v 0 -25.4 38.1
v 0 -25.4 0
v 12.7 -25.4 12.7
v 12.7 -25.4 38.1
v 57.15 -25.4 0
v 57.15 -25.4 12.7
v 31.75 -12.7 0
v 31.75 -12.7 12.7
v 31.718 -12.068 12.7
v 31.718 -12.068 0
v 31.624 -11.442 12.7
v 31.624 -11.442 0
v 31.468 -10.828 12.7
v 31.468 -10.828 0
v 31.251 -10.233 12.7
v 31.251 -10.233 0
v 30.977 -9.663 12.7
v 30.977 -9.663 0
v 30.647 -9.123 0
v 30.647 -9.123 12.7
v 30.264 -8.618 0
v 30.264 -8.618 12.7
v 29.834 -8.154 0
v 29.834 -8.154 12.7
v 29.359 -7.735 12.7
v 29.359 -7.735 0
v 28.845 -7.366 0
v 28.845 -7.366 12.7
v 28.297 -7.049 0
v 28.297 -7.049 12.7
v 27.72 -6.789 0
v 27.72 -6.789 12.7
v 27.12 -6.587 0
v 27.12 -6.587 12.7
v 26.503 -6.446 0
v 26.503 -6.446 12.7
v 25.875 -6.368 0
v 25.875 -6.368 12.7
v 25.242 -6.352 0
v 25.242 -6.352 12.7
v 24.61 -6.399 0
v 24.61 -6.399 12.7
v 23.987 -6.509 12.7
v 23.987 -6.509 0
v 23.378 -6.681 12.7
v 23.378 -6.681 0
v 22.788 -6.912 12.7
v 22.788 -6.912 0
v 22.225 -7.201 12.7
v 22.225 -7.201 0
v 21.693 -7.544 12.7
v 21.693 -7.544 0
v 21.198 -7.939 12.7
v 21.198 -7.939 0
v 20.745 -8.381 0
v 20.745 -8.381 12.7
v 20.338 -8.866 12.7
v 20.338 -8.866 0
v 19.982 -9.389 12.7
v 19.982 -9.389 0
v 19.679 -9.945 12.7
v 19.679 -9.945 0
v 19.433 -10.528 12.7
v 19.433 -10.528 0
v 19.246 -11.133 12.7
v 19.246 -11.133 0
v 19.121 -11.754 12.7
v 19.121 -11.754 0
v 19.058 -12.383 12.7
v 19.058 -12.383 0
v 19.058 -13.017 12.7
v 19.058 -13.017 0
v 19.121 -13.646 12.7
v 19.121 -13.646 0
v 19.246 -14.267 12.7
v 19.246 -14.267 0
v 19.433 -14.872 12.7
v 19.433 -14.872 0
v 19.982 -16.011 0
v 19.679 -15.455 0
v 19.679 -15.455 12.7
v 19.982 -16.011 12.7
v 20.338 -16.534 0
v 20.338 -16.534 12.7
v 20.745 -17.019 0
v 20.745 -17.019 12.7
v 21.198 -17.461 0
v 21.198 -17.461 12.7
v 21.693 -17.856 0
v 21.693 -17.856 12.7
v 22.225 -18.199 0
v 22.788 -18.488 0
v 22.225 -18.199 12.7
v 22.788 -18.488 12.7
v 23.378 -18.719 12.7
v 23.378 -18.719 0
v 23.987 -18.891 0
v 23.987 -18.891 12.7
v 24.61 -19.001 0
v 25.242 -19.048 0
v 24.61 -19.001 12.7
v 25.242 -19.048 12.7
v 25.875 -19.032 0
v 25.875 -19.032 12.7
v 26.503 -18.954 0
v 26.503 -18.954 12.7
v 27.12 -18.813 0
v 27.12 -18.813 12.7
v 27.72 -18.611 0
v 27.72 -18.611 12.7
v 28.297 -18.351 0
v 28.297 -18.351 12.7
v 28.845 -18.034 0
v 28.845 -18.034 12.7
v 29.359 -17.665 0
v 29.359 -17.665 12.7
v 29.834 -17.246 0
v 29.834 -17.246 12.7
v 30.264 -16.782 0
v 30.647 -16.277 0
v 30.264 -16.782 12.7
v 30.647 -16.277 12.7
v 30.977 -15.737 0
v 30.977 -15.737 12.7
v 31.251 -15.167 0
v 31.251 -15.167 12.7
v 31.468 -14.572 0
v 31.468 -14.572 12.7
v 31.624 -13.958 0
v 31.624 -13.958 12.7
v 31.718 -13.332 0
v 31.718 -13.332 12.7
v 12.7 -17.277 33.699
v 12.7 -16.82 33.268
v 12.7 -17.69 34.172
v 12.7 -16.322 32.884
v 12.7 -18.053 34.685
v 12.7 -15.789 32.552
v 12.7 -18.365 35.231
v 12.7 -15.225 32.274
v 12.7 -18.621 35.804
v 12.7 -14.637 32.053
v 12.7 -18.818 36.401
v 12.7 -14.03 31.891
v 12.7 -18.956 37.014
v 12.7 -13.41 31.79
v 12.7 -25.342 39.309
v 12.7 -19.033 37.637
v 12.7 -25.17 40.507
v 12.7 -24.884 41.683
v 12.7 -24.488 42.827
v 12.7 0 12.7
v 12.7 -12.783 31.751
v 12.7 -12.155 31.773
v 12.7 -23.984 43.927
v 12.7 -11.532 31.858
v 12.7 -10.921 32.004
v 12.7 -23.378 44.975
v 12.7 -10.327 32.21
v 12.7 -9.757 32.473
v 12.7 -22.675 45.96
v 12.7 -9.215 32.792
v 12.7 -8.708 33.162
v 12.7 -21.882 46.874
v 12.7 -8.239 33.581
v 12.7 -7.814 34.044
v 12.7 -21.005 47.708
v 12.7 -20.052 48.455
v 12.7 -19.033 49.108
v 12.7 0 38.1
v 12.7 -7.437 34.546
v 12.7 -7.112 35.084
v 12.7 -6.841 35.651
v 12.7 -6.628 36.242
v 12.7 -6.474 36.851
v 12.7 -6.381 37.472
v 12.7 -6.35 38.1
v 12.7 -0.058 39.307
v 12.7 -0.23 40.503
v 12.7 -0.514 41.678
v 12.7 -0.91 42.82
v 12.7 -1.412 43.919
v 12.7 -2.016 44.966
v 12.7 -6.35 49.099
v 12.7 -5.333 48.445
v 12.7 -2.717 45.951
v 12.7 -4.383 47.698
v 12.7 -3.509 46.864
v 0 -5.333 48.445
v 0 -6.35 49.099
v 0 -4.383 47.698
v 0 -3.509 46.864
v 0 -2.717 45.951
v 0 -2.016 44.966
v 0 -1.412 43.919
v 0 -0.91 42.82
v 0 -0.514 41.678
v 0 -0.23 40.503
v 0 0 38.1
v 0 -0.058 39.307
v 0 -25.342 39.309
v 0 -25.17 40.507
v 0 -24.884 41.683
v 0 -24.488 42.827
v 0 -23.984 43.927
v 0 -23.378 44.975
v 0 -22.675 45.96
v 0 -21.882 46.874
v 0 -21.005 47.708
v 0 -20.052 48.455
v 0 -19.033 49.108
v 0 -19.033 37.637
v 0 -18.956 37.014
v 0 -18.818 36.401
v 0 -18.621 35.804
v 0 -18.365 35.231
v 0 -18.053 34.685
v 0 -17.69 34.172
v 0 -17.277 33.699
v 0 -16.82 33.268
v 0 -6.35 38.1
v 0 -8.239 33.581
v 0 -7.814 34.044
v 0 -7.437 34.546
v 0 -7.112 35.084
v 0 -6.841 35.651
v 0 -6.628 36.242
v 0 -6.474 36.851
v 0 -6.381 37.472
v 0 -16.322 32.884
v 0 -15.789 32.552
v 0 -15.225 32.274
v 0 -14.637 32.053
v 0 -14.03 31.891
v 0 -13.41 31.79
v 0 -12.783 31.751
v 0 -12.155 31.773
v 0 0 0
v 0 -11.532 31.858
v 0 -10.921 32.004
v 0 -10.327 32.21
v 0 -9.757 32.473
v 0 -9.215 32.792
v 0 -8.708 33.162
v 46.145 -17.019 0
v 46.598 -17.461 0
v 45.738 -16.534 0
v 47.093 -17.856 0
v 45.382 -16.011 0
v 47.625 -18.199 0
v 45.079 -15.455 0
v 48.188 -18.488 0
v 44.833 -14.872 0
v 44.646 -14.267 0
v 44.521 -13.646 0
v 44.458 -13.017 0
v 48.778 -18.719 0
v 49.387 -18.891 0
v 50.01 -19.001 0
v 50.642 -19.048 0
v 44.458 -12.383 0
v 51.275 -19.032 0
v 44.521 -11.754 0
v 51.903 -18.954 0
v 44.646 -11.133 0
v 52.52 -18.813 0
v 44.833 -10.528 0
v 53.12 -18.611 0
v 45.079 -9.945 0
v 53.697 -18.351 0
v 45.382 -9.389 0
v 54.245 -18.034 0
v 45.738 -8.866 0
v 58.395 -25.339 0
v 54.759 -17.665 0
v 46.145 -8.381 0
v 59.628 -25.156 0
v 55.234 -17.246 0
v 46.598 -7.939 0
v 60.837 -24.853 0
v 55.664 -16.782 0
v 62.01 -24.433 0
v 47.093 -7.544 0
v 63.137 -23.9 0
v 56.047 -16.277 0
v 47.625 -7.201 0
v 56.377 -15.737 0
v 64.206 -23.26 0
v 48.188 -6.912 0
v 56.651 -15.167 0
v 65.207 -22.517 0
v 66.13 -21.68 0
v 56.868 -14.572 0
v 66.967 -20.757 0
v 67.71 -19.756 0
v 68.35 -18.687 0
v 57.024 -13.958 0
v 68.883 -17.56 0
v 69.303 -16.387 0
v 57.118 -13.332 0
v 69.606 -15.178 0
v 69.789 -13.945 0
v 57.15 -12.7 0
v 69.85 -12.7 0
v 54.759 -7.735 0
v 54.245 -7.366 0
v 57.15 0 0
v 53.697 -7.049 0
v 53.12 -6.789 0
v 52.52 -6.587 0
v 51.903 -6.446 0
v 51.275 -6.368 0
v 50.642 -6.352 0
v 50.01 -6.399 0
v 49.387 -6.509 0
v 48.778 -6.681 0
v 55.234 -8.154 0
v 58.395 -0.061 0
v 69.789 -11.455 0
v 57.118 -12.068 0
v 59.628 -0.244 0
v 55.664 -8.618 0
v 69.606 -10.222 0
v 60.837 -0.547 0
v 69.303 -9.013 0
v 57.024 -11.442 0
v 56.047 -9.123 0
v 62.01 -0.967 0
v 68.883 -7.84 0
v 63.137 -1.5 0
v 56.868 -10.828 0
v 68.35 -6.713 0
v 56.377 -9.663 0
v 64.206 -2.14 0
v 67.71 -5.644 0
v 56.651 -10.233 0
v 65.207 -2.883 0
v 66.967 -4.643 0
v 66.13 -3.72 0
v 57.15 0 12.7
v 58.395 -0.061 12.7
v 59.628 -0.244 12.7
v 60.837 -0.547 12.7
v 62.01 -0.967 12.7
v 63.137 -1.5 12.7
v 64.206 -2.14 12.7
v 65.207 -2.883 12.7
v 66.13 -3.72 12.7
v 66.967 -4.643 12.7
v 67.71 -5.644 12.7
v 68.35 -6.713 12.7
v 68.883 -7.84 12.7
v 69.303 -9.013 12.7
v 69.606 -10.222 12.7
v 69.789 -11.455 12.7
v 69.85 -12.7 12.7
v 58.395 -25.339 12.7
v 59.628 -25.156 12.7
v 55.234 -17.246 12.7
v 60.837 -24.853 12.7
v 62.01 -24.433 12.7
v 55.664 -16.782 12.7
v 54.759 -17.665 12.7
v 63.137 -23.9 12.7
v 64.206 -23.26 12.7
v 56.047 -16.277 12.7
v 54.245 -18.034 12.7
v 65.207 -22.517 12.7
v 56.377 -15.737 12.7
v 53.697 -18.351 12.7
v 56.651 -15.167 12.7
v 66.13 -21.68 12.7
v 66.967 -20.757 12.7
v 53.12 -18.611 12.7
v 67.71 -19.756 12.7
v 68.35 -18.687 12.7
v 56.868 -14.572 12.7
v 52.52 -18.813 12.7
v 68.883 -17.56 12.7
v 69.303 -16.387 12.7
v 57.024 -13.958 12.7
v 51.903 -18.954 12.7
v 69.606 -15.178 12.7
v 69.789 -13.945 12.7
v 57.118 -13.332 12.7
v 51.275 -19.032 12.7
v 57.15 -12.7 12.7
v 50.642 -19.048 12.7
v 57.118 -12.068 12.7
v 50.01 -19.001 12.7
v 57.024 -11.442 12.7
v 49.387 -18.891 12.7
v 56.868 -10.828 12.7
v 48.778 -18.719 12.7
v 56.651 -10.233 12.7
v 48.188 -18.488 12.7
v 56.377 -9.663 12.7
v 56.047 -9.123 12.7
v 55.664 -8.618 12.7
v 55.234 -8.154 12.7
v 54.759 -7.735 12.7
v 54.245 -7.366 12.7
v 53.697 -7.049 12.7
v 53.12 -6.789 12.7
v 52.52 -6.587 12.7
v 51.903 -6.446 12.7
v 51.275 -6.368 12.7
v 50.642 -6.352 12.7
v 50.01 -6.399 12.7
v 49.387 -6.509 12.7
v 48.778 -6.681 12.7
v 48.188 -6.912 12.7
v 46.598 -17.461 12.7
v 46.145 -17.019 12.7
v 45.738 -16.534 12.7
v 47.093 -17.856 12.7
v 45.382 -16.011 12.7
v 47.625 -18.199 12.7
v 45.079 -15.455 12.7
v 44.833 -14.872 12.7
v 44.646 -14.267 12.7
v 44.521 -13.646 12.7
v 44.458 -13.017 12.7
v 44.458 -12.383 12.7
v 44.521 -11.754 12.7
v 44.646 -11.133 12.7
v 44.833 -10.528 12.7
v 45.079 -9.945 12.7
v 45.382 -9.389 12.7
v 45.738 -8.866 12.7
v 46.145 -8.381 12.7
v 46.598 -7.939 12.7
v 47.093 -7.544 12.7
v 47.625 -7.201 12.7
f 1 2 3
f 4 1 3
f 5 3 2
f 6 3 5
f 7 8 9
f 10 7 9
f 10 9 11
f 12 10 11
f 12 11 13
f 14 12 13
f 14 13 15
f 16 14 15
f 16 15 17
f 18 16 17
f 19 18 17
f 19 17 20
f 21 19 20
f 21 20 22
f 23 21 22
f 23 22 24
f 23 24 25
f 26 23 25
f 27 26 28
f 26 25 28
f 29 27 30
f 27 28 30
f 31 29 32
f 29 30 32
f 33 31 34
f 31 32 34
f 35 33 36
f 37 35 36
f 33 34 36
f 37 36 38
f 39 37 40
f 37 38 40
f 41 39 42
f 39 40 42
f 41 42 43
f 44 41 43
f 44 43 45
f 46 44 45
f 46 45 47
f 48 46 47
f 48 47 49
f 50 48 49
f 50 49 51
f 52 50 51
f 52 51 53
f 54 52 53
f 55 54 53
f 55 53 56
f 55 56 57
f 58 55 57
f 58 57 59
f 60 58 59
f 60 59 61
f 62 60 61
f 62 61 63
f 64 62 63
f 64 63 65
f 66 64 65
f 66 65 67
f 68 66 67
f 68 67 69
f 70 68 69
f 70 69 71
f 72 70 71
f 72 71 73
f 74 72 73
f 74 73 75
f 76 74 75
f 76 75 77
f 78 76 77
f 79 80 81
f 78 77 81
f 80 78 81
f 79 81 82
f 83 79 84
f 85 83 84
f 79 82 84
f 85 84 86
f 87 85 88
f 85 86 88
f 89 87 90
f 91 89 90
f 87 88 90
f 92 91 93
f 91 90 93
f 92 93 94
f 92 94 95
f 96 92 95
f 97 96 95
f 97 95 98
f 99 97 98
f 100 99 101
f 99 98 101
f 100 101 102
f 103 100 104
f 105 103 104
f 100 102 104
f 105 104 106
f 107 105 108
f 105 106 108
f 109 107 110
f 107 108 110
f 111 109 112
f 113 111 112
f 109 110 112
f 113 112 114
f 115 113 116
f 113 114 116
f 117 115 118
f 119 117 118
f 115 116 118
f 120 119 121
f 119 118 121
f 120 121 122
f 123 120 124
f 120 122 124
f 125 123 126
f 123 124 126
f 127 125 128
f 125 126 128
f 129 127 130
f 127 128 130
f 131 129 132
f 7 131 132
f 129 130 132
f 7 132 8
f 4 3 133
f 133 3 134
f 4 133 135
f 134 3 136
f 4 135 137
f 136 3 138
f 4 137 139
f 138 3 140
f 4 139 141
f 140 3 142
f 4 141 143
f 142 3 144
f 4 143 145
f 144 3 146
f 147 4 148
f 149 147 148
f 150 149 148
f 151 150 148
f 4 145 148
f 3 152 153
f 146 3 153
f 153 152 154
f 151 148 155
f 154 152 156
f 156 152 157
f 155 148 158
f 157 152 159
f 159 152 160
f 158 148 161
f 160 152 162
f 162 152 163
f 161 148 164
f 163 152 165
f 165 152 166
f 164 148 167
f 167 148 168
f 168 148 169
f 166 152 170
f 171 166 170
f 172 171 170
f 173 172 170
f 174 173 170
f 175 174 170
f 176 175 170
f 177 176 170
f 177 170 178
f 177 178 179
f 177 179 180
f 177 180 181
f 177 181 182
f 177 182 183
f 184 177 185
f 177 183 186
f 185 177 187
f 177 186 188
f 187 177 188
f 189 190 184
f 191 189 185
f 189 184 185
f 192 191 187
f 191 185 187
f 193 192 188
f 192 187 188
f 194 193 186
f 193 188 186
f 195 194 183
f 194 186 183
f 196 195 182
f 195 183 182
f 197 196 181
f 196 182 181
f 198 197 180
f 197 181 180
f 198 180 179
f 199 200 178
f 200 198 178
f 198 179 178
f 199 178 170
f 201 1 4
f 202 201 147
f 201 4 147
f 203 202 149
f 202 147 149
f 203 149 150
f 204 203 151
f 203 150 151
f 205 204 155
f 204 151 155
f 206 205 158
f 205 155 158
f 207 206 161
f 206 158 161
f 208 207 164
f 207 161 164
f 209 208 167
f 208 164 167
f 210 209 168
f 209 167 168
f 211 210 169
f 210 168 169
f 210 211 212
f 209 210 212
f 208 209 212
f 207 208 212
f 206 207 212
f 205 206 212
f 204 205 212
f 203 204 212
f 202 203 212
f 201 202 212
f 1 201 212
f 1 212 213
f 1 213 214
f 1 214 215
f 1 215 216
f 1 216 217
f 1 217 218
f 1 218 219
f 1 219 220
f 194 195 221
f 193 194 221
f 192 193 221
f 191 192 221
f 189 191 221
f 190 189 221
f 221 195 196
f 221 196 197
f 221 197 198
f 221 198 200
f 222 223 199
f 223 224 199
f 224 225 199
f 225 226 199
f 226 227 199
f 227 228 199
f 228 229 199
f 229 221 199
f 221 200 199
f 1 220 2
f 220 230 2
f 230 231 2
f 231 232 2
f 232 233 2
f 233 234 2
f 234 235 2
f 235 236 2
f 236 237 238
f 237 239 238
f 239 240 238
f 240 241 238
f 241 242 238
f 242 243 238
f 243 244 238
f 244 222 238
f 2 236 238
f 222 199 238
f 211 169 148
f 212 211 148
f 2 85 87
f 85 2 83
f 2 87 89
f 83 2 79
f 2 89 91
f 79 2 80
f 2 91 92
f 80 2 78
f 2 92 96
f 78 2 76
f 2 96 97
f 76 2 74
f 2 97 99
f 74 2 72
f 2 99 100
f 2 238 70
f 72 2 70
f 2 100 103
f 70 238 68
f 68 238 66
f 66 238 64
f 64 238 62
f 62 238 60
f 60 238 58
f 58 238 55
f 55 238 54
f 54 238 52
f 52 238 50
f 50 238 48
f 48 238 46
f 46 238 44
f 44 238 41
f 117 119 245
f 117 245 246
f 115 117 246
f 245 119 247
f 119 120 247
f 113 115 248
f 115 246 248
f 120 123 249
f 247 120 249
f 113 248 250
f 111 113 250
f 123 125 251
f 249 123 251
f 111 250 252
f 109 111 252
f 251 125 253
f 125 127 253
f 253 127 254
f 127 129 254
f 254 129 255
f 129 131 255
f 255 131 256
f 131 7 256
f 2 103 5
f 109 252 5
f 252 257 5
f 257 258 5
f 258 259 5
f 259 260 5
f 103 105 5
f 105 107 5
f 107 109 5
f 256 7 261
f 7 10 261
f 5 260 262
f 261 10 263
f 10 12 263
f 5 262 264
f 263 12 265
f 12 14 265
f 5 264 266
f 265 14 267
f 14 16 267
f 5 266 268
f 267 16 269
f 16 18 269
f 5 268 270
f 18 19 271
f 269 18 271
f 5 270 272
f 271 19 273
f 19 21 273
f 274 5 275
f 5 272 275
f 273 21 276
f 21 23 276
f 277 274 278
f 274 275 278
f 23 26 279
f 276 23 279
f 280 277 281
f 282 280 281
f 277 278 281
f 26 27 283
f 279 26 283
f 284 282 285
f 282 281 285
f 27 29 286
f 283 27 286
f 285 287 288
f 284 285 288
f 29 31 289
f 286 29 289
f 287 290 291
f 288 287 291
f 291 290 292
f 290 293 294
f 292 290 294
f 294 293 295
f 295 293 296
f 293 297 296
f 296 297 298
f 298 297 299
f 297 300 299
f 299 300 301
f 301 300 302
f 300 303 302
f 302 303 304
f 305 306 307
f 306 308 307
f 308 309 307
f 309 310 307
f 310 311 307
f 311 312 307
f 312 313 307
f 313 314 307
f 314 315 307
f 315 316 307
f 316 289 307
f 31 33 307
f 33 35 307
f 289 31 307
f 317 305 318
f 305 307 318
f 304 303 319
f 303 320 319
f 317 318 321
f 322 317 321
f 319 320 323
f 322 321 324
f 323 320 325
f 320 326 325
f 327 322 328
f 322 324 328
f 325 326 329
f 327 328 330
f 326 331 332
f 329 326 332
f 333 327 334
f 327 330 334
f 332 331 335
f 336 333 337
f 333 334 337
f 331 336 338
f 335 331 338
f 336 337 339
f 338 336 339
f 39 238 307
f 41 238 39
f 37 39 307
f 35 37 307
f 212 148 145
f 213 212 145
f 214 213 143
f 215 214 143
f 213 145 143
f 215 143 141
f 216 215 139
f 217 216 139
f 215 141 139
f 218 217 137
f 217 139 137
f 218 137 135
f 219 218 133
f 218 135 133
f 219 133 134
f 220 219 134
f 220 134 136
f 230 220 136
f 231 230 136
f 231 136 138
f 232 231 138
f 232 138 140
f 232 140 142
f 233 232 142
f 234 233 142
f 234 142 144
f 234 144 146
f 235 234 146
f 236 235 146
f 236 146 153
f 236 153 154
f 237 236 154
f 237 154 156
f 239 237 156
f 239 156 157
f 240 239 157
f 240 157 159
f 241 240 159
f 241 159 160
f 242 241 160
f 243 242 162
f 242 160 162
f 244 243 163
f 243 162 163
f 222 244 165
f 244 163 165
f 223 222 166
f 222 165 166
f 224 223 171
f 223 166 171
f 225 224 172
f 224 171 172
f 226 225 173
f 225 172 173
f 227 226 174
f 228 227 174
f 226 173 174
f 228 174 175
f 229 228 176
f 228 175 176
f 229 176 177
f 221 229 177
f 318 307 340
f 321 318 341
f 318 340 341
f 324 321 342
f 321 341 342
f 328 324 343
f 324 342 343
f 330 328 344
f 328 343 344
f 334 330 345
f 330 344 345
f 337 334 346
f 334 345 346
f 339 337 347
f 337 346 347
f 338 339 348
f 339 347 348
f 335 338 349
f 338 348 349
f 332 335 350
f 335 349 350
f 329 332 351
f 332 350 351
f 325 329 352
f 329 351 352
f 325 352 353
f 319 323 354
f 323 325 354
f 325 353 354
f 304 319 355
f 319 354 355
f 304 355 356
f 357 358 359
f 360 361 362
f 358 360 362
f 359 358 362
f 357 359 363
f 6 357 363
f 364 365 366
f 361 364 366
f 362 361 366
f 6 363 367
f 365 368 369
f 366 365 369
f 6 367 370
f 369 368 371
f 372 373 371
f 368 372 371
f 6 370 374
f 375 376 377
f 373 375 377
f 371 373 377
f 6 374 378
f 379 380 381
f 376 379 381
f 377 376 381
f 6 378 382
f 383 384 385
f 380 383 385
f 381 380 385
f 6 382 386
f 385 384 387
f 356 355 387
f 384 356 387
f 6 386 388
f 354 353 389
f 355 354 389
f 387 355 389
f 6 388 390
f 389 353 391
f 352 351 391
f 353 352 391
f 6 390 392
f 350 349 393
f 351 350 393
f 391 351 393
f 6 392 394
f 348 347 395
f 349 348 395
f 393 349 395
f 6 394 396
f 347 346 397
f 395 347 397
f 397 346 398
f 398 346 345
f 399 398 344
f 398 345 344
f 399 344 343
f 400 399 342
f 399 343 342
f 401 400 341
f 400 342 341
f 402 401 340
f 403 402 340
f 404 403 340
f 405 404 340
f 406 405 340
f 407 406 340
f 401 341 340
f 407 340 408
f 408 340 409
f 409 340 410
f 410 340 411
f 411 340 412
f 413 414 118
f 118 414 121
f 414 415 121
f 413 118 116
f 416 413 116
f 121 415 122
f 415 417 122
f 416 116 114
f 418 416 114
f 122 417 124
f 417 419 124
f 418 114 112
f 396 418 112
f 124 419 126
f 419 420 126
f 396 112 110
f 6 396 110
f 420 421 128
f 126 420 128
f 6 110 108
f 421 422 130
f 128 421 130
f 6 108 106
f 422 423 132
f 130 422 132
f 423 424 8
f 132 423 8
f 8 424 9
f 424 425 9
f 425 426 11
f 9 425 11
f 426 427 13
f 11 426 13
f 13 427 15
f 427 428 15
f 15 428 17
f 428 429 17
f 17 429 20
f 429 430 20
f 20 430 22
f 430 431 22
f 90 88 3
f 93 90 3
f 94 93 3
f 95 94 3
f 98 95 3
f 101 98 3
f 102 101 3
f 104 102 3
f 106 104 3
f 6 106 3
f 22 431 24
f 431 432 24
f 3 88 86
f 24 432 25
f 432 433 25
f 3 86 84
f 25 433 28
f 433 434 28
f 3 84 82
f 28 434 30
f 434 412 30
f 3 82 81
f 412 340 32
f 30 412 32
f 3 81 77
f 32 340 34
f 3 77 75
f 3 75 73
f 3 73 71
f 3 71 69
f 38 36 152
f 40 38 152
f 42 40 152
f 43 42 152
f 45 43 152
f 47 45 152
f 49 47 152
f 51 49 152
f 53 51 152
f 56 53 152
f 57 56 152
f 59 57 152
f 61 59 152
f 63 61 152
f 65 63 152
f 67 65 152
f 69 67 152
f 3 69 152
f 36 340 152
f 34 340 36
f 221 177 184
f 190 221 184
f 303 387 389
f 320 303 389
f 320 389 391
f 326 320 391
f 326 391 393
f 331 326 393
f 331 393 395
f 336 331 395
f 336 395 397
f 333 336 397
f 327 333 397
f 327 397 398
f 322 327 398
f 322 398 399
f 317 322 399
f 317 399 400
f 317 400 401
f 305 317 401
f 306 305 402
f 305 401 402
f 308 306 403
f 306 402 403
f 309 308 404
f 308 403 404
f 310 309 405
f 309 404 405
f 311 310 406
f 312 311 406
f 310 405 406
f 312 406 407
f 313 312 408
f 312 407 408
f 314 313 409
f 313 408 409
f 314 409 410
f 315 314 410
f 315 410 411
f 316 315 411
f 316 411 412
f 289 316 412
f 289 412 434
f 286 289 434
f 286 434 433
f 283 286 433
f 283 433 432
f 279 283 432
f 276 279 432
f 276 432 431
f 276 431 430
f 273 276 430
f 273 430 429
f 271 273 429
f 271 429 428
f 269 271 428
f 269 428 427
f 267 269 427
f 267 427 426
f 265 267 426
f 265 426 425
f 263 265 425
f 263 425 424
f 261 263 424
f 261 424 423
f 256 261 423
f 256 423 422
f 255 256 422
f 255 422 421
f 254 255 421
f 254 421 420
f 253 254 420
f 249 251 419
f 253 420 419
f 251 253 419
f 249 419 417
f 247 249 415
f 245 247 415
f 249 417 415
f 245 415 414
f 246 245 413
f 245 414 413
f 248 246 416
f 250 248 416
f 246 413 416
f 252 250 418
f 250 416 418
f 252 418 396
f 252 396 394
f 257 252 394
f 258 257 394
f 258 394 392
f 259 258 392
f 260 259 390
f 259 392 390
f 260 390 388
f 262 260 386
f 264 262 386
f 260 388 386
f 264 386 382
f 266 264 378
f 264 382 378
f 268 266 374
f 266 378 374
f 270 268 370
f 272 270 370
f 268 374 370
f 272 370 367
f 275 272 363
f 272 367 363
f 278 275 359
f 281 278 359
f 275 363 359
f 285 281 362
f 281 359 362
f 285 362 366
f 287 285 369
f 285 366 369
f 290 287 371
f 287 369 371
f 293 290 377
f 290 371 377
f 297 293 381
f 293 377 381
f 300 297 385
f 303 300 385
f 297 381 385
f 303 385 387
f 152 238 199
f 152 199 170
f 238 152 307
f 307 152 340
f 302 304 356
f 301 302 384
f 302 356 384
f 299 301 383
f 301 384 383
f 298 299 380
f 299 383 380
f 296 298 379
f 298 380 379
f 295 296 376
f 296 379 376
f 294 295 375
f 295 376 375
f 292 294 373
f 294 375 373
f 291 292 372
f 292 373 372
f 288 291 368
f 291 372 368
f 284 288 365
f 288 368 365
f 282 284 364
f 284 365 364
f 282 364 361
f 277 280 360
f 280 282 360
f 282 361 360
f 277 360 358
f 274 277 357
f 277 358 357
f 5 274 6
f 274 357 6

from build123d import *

# Parameters (mm, degrees)
F1_DEPTH = 25.4
F2_R     = 6.35
F3_DEPTH = 25.4
F5_DEPTH = 25.4
F7_DEPTH = 25.4


with BuildPart() as f1:
    # F0 (on Front) → F1 (new body)
    with BuildSketch(Plane.XZ):
        Polygon((12.7, 50.8), (0, 50.8), (0, 0), (69.85, 0), (69.85, 12.7), (12.7, 12.7), align=None)
    extrude(amount=F1_DEPTH)

    # F2 (on face) → F3 (cut)
    with BuildSketch(Plane.XY.offset(12.7)):
        with Locations((25.4, -12.7)):
            Circle(F2_R)
        with BuildLine():
            Line((69.85, -25.4), (69.85, -12.7))
            ThreePointArc((69.85, -12.7), (66.1302561211, -21.6802561211), (57.15, -25.4))
            Line((57.15, -25.4), (69.85, -25.4))
        make_face()
        with Locations((50.8, -12.7)):
            Circle(F2_R)
        with BuildLine():
            Line((69.85, 0), (57.15, 0))
            ThreePointArc((57.15, 0), (66.1302561211, -3.7197438789), (69.85, -12.7))
            Line((69.85, -12.7), (69.85, 0))
        make_face()
    extrude(amount=-F3_DEPTH, mode=Mode.SUBTRACT)

    # F4 (on face) → F5 (cut)
    with BuildSketch(Plane.YZ.offset(12.7)):
        with BuildLine():
            Line((0, 38.1), (0, 39.259262383))
            Line((0, 39.259262383), (0, 50.8))
            Line((0, 50.8), (-12.7, 50.8))
            ThreePointArc((-12.7, 50.8), (-3.7197438789, 47.0802561211), (0, 38.1))
        make_face()
        with BuildLine():
            ThreePointArc((-25.4, 38.1), (-21.6802561211, 47.0802561211), (-12.7, 50.8))
            Line((-12.7, 50.8), (-25.4, 50.8))
            Line((-25.4, 50.8), (-25.4, 39.259262383))
            Line((-25.4, 39.259262383), (-25.4, 38.1))
        make_face()
    extrude(amount=-F5_DEPTH, mode=Mode.SUBTRACT)

    # F6 (on face) → F7 (cut)
    with BuildSketch(Plane.YZ.offset(12.7)):
        with BuildLine():
            Line((-19.0331310429, 38.5625485848), (-19.0331310429, 37.6374514152))
            ThreePointArc((-19.0331310429, 37.6374514152), (-12.4685719577, 31.7542186406), (-6.35, 38.1))
            ThreePointArc((-6.35, 38.1), (-12.4685719577, 44.4457813594), (-19.0331310429, 38.5625485848))
        make_face()
        with BuildLine():
            ThreePointArc((-19.0331310429, 38.5625485848), (-12.4685719577, 44.4457813594), (-6.35, 38.1))
            Line((-6.35, 38.1), (-6.35, 49.0985226281))
            ThreePointArc((-6.35, 49.0985226281), (-12.6902650085, 50.7999962689), (-19.0331310429, 49.1082446917))
            Line((-19.0331310429, 49.1082446917), (-19.0331310429, 38.5625485848))
        make_face()
    extrude(amount=-F7_DEPTH, mode=Mode.SUBTRACT)


solid = f1.part
